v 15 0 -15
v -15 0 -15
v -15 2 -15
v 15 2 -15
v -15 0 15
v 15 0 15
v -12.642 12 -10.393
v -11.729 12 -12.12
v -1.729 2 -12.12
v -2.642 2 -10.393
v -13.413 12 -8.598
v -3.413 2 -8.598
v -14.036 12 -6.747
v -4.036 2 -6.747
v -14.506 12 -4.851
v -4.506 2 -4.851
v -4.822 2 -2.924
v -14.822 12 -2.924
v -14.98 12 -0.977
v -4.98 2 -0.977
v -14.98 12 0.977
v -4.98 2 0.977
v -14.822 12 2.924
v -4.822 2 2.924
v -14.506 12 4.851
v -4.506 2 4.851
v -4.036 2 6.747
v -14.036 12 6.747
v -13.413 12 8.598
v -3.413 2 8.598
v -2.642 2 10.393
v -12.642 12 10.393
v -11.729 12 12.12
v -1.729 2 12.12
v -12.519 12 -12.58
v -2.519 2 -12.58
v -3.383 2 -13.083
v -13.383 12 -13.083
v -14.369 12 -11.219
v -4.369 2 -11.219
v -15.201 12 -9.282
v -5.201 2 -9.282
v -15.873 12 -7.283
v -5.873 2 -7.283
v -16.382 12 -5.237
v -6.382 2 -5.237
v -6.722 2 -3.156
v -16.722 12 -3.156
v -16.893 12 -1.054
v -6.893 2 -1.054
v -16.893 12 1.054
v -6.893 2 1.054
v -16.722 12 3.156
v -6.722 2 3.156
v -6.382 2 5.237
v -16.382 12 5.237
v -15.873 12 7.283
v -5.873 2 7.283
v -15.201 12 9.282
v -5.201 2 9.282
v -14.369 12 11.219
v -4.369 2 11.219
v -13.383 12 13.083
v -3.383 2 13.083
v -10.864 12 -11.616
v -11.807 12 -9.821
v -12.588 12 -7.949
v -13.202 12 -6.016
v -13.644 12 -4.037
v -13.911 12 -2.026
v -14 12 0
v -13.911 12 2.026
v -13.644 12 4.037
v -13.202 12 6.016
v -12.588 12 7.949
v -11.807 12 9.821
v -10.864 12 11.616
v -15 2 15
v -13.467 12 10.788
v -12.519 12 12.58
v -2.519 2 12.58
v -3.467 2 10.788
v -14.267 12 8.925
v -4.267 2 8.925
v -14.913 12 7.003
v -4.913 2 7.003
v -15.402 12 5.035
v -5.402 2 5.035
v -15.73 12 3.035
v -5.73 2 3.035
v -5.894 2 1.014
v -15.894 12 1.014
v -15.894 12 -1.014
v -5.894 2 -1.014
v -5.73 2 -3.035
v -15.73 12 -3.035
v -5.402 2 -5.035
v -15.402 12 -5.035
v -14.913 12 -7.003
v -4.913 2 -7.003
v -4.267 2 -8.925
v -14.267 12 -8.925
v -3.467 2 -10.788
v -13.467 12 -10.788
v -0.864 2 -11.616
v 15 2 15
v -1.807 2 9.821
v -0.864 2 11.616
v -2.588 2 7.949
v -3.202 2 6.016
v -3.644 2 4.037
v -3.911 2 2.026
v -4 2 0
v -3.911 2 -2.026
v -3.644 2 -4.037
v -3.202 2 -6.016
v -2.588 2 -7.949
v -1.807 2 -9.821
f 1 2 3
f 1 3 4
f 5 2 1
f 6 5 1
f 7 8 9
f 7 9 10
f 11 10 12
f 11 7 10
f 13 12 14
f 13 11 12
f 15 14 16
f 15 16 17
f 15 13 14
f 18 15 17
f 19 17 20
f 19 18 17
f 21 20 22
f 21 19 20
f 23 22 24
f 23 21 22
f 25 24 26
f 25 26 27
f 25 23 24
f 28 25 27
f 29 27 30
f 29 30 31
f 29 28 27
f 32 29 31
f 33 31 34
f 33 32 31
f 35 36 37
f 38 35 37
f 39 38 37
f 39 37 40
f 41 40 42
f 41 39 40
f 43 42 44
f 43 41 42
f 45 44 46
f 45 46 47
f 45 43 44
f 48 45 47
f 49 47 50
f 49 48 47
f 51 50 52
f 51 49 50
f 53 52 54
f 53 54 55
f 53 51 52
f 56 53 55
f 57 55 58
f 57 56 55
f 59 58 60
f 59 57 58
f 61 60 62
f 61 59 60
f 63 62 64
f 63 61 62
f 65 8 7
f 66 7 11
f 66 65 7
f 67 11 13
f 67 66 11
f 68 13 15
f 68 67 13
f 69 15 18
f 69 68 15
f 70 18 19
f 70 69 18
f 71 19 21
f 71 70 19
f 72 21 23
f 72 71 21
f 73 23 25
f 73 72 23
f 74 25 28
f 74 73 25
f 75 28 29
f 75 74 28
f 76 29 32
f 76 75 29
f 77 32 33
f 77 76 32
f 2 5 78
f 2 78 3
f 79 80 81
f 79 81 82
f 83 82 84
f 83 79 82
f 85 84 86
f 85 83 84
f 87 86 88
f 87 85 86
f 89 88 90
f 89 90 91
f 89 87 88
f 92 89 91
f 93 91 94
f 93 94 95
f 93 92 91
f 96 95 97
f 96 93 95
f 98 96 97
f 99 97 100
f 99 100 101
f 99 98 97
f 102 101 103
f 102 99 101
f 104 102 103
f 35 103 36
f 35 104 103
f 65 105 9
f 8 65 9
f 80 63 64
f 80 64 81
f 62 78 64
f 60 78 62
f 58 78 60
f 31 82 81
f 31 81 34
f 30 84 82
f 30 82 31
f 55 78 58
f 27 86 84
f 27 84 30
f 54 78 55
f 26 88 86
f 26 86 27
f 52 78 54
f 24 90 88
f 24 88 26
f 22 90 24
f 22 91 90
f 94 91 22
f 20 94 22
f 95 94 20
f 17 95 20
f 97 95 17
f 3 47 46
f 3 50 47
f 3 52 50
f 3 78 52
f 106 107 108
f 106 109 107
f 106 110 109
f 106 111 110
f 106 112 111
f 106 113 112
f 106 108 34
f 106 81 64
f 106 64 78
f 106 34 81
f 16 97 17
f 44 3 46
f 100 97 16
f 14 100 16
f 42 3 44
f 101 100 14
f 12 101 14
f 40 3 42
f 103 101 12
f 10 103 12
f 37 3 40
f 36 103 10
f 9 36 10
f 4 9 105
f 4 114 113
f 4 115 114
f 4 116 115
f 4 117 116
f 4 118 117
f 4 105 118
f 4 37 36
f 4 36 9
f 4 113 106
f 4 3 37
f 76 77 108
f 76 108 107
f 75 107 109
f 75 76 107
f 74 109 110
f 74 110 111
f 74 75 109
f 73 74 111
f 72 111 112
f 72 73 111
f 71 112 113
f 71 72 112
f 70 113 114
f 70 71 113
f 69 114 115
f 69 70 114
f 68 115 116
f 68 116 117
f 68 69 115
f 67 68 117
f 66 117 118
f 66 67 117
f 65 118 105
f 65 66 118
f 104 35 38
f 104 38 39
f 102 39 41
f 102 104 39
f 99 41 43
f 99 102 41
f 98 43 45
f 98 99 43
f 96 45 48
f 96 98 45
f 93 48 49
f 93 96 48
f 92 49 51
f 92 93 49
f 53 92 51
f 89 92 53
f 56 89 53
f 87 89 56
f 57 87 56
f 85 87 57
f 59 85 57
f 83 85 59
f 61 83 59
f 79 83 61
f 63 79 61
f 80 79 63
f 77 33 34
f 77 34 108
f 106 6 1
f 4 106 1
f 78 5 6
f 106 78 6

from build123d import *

# Parameters (mm, degrees)
SKETCH2_W           = 30
SKETCH2_H           = 30
BOSS_EXTRUDE1_DEPTH = 2


with BuildPart() as part:
    # Sketch2 → Boss-Extrude1 (new body)
    with BuildSketch(Plane(origin=(0, 0, 0), x_dir=(1, 0, 0), z_dir=(0, 1, 0))):
        Rectangle(SKETCH2_W, SKETCH2_H)
    extrude(amount=BOSS_EXTRUDE1_DEPTH)

    # Sweep1: sweep along a path in Sketch13
    with BuildLine(Plane.XY) as sweep1_path:
        Line((15, 2), (5, 12))
    # Sketch12 → Sweep1 (sweep)
    with BuildSketch(Plane(origin=(0, 2, 0), x_dir=(1, 0, 0), z_dir=(0, 1, 0))):
        with BuildLine():
            Line((-0.864419204, 11.616439262), (-1.728595106, 12.119629097))
            ThreePointArc((-1.728595106, 12.119629097), (-5, 0), (-1.728595106, -12.119629097))
            Line((-1.728595106, -12.119629097), (-0.864419204, -11.616439262))
            ThreePointArc((-0.864419204, -11.616439262), (-4, 0), (-0.864419204, 11.616439262))
        make_face()
        with BuildLine():
            Line((-2.518797551, 12.579745882), (-3.382973453, 13.082935717))
            ThreePointArc((-3.382973453, 13.082935717), (-6.9144, 0), (-3.382973453, -13.082935717))
            Line((-3.382973453, -13.082935717), (-2.518797551, -12.579745882))
            ThreePointArc((-2.518797551, -12.579745882), (-5.9144, 0), (-2.518797551, 12.579745882))
        make_face()
    sweep(path=sweep1_path.line)


solid = part.part
